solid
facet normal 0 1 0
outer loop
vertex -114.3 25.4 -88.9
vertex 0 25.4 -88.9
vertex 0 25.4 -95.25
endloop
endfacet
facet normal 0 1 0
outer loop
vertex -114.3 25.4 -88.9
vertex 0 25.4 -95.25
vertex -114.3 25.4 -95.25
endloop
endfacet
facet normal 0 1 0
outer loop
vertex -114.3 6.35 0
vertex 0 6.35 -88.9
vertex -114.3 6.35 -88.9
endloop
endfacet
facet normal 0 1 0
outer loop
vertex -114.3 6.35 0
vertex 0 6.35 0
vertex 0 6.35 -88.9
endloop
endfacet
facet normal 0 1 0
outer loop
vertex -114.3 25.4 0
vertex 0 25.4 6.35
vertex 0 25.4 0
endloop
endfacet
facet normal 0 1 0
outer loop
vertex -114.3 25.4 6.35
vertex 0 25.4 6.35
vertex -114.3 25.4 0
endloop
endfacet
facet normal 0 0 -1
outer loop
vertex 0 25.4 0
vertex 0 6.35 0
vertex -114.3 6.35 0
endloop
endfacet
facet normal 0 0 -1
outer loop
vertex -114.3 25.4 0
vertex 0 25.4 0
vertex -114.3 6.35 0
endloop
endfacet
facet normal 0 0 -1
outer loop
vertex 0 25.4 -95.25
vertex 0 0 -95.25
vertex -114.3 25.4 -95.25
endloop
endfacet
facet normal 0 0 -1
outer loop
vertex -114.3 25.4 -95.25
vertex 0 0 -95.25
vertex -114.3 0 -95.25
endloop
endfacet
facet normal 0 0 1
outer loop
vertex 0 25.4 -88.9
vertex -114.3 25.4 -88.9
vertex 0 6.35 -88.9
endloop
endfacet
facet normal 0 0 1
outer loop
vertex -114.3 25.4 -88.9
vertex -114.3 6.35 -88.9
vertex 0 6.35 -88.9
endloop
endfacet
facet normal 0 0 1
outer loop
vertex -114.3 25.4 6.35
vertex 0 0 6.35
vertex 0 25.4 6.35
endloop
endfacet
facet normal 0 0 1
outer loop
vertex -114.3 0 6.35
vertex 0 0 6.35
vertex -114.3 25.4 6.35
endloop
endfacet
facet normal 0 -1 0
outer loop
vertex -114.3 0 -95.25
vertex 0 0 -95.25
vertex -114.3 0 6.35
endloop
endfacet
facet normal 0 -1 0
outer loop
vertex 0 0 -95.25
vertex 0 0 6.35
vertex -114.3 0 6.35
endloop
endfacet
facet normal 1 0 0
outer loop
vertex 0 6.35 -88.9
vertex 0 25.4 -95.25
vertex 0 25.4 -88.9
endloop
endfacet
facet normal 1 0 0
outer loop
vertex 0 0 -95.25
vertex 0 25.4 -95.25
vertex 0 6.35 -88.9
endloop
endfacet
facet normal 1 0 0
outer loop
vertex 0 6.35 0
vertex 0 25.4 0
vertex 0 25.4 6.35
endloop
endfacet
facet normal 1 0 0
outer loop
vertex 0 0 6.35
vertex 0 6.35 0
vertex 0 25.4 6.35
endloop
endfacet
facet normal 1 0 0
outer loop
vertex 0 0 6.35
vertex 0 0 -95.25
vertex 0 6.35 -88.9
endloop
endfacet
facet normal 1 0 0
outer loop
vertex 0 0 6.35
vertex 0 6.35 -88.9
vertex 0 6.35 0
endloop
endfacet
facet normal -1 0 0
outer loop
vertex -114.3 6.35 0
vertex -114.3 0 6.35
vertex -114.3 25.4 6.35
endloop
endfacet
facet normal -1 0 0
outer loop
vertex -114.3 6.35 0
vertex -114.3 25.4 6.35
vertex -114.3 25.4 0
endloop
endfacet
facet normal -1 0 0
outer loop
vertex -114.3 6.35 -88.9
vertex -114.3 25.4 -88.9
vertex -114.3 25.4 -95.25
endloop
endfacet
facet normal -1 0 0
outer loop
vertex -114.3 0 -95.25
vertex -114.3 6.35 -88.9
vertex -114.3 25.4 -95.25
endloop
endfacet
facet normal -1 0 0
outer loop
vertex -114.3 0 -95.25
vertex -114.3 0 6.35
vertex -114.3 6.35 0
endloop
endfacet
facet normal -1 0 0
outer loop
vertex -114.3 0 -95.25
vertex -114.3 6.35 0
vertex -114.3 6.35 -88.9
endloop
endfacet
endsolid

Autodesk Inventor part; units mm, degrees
ref_plane "YZ Plane" through (0, 0, 0) normal (1, 0, 0) x (0, 1, 0)
ref_plane "XZ Plane" through (0, 0, 0) normal (0, 1, 0) x (-1, 0, 0)
ref_plane "XY Plane" through (0, 0, 0) normal (0, 0, 1) x (1, 0, 0)
sketch "Sketch1" plane through (0, 0, 0) normal (0, 1, 0) x (-1, 0, 0)
  line L0 (0, 0) -> (114.3, 0)
  line L1 (114.3, 0) -> (114.3, -88.9)
  line L2 (114.3, -88.9) -> (0, -88.9)
  line L3 (0, -88.9) -> (0, 0)
  line L4 (114.3, 0) -> (0, 0)
  line L5 (0, 0) -> (0, 6.35)
  line L6 (0, 6.35) -> (114.3, 6.35)
  line L7 (114.3, 6.35) -> (114.3, 0)
  line L8 (114.3, -88.9) -> (0, -88.9)
  line L9 (0, -88.9) -> (0, -95.25)
  line L10 (0, -95.25) -> (114.3, -95.25)
  line L11 (114.3, -95.25) -> (114.3, -88.9)
  dimension "d0" = 114.3
  dimension "d1" = 88.9
  dimension "d2" = 6.35
  dimension "d3" = 6.35
extrude "Extrusion1" add sketch "Sketch1" along normal blind 6.35 contours L0 L1 L2 L3
extrude "Extrusion2" add sketch "Sketch1" along normal blind 25.4 contours L5 L6 L7 L0 | L2 L11 L10 L9
properties part number "marker relese plate"
